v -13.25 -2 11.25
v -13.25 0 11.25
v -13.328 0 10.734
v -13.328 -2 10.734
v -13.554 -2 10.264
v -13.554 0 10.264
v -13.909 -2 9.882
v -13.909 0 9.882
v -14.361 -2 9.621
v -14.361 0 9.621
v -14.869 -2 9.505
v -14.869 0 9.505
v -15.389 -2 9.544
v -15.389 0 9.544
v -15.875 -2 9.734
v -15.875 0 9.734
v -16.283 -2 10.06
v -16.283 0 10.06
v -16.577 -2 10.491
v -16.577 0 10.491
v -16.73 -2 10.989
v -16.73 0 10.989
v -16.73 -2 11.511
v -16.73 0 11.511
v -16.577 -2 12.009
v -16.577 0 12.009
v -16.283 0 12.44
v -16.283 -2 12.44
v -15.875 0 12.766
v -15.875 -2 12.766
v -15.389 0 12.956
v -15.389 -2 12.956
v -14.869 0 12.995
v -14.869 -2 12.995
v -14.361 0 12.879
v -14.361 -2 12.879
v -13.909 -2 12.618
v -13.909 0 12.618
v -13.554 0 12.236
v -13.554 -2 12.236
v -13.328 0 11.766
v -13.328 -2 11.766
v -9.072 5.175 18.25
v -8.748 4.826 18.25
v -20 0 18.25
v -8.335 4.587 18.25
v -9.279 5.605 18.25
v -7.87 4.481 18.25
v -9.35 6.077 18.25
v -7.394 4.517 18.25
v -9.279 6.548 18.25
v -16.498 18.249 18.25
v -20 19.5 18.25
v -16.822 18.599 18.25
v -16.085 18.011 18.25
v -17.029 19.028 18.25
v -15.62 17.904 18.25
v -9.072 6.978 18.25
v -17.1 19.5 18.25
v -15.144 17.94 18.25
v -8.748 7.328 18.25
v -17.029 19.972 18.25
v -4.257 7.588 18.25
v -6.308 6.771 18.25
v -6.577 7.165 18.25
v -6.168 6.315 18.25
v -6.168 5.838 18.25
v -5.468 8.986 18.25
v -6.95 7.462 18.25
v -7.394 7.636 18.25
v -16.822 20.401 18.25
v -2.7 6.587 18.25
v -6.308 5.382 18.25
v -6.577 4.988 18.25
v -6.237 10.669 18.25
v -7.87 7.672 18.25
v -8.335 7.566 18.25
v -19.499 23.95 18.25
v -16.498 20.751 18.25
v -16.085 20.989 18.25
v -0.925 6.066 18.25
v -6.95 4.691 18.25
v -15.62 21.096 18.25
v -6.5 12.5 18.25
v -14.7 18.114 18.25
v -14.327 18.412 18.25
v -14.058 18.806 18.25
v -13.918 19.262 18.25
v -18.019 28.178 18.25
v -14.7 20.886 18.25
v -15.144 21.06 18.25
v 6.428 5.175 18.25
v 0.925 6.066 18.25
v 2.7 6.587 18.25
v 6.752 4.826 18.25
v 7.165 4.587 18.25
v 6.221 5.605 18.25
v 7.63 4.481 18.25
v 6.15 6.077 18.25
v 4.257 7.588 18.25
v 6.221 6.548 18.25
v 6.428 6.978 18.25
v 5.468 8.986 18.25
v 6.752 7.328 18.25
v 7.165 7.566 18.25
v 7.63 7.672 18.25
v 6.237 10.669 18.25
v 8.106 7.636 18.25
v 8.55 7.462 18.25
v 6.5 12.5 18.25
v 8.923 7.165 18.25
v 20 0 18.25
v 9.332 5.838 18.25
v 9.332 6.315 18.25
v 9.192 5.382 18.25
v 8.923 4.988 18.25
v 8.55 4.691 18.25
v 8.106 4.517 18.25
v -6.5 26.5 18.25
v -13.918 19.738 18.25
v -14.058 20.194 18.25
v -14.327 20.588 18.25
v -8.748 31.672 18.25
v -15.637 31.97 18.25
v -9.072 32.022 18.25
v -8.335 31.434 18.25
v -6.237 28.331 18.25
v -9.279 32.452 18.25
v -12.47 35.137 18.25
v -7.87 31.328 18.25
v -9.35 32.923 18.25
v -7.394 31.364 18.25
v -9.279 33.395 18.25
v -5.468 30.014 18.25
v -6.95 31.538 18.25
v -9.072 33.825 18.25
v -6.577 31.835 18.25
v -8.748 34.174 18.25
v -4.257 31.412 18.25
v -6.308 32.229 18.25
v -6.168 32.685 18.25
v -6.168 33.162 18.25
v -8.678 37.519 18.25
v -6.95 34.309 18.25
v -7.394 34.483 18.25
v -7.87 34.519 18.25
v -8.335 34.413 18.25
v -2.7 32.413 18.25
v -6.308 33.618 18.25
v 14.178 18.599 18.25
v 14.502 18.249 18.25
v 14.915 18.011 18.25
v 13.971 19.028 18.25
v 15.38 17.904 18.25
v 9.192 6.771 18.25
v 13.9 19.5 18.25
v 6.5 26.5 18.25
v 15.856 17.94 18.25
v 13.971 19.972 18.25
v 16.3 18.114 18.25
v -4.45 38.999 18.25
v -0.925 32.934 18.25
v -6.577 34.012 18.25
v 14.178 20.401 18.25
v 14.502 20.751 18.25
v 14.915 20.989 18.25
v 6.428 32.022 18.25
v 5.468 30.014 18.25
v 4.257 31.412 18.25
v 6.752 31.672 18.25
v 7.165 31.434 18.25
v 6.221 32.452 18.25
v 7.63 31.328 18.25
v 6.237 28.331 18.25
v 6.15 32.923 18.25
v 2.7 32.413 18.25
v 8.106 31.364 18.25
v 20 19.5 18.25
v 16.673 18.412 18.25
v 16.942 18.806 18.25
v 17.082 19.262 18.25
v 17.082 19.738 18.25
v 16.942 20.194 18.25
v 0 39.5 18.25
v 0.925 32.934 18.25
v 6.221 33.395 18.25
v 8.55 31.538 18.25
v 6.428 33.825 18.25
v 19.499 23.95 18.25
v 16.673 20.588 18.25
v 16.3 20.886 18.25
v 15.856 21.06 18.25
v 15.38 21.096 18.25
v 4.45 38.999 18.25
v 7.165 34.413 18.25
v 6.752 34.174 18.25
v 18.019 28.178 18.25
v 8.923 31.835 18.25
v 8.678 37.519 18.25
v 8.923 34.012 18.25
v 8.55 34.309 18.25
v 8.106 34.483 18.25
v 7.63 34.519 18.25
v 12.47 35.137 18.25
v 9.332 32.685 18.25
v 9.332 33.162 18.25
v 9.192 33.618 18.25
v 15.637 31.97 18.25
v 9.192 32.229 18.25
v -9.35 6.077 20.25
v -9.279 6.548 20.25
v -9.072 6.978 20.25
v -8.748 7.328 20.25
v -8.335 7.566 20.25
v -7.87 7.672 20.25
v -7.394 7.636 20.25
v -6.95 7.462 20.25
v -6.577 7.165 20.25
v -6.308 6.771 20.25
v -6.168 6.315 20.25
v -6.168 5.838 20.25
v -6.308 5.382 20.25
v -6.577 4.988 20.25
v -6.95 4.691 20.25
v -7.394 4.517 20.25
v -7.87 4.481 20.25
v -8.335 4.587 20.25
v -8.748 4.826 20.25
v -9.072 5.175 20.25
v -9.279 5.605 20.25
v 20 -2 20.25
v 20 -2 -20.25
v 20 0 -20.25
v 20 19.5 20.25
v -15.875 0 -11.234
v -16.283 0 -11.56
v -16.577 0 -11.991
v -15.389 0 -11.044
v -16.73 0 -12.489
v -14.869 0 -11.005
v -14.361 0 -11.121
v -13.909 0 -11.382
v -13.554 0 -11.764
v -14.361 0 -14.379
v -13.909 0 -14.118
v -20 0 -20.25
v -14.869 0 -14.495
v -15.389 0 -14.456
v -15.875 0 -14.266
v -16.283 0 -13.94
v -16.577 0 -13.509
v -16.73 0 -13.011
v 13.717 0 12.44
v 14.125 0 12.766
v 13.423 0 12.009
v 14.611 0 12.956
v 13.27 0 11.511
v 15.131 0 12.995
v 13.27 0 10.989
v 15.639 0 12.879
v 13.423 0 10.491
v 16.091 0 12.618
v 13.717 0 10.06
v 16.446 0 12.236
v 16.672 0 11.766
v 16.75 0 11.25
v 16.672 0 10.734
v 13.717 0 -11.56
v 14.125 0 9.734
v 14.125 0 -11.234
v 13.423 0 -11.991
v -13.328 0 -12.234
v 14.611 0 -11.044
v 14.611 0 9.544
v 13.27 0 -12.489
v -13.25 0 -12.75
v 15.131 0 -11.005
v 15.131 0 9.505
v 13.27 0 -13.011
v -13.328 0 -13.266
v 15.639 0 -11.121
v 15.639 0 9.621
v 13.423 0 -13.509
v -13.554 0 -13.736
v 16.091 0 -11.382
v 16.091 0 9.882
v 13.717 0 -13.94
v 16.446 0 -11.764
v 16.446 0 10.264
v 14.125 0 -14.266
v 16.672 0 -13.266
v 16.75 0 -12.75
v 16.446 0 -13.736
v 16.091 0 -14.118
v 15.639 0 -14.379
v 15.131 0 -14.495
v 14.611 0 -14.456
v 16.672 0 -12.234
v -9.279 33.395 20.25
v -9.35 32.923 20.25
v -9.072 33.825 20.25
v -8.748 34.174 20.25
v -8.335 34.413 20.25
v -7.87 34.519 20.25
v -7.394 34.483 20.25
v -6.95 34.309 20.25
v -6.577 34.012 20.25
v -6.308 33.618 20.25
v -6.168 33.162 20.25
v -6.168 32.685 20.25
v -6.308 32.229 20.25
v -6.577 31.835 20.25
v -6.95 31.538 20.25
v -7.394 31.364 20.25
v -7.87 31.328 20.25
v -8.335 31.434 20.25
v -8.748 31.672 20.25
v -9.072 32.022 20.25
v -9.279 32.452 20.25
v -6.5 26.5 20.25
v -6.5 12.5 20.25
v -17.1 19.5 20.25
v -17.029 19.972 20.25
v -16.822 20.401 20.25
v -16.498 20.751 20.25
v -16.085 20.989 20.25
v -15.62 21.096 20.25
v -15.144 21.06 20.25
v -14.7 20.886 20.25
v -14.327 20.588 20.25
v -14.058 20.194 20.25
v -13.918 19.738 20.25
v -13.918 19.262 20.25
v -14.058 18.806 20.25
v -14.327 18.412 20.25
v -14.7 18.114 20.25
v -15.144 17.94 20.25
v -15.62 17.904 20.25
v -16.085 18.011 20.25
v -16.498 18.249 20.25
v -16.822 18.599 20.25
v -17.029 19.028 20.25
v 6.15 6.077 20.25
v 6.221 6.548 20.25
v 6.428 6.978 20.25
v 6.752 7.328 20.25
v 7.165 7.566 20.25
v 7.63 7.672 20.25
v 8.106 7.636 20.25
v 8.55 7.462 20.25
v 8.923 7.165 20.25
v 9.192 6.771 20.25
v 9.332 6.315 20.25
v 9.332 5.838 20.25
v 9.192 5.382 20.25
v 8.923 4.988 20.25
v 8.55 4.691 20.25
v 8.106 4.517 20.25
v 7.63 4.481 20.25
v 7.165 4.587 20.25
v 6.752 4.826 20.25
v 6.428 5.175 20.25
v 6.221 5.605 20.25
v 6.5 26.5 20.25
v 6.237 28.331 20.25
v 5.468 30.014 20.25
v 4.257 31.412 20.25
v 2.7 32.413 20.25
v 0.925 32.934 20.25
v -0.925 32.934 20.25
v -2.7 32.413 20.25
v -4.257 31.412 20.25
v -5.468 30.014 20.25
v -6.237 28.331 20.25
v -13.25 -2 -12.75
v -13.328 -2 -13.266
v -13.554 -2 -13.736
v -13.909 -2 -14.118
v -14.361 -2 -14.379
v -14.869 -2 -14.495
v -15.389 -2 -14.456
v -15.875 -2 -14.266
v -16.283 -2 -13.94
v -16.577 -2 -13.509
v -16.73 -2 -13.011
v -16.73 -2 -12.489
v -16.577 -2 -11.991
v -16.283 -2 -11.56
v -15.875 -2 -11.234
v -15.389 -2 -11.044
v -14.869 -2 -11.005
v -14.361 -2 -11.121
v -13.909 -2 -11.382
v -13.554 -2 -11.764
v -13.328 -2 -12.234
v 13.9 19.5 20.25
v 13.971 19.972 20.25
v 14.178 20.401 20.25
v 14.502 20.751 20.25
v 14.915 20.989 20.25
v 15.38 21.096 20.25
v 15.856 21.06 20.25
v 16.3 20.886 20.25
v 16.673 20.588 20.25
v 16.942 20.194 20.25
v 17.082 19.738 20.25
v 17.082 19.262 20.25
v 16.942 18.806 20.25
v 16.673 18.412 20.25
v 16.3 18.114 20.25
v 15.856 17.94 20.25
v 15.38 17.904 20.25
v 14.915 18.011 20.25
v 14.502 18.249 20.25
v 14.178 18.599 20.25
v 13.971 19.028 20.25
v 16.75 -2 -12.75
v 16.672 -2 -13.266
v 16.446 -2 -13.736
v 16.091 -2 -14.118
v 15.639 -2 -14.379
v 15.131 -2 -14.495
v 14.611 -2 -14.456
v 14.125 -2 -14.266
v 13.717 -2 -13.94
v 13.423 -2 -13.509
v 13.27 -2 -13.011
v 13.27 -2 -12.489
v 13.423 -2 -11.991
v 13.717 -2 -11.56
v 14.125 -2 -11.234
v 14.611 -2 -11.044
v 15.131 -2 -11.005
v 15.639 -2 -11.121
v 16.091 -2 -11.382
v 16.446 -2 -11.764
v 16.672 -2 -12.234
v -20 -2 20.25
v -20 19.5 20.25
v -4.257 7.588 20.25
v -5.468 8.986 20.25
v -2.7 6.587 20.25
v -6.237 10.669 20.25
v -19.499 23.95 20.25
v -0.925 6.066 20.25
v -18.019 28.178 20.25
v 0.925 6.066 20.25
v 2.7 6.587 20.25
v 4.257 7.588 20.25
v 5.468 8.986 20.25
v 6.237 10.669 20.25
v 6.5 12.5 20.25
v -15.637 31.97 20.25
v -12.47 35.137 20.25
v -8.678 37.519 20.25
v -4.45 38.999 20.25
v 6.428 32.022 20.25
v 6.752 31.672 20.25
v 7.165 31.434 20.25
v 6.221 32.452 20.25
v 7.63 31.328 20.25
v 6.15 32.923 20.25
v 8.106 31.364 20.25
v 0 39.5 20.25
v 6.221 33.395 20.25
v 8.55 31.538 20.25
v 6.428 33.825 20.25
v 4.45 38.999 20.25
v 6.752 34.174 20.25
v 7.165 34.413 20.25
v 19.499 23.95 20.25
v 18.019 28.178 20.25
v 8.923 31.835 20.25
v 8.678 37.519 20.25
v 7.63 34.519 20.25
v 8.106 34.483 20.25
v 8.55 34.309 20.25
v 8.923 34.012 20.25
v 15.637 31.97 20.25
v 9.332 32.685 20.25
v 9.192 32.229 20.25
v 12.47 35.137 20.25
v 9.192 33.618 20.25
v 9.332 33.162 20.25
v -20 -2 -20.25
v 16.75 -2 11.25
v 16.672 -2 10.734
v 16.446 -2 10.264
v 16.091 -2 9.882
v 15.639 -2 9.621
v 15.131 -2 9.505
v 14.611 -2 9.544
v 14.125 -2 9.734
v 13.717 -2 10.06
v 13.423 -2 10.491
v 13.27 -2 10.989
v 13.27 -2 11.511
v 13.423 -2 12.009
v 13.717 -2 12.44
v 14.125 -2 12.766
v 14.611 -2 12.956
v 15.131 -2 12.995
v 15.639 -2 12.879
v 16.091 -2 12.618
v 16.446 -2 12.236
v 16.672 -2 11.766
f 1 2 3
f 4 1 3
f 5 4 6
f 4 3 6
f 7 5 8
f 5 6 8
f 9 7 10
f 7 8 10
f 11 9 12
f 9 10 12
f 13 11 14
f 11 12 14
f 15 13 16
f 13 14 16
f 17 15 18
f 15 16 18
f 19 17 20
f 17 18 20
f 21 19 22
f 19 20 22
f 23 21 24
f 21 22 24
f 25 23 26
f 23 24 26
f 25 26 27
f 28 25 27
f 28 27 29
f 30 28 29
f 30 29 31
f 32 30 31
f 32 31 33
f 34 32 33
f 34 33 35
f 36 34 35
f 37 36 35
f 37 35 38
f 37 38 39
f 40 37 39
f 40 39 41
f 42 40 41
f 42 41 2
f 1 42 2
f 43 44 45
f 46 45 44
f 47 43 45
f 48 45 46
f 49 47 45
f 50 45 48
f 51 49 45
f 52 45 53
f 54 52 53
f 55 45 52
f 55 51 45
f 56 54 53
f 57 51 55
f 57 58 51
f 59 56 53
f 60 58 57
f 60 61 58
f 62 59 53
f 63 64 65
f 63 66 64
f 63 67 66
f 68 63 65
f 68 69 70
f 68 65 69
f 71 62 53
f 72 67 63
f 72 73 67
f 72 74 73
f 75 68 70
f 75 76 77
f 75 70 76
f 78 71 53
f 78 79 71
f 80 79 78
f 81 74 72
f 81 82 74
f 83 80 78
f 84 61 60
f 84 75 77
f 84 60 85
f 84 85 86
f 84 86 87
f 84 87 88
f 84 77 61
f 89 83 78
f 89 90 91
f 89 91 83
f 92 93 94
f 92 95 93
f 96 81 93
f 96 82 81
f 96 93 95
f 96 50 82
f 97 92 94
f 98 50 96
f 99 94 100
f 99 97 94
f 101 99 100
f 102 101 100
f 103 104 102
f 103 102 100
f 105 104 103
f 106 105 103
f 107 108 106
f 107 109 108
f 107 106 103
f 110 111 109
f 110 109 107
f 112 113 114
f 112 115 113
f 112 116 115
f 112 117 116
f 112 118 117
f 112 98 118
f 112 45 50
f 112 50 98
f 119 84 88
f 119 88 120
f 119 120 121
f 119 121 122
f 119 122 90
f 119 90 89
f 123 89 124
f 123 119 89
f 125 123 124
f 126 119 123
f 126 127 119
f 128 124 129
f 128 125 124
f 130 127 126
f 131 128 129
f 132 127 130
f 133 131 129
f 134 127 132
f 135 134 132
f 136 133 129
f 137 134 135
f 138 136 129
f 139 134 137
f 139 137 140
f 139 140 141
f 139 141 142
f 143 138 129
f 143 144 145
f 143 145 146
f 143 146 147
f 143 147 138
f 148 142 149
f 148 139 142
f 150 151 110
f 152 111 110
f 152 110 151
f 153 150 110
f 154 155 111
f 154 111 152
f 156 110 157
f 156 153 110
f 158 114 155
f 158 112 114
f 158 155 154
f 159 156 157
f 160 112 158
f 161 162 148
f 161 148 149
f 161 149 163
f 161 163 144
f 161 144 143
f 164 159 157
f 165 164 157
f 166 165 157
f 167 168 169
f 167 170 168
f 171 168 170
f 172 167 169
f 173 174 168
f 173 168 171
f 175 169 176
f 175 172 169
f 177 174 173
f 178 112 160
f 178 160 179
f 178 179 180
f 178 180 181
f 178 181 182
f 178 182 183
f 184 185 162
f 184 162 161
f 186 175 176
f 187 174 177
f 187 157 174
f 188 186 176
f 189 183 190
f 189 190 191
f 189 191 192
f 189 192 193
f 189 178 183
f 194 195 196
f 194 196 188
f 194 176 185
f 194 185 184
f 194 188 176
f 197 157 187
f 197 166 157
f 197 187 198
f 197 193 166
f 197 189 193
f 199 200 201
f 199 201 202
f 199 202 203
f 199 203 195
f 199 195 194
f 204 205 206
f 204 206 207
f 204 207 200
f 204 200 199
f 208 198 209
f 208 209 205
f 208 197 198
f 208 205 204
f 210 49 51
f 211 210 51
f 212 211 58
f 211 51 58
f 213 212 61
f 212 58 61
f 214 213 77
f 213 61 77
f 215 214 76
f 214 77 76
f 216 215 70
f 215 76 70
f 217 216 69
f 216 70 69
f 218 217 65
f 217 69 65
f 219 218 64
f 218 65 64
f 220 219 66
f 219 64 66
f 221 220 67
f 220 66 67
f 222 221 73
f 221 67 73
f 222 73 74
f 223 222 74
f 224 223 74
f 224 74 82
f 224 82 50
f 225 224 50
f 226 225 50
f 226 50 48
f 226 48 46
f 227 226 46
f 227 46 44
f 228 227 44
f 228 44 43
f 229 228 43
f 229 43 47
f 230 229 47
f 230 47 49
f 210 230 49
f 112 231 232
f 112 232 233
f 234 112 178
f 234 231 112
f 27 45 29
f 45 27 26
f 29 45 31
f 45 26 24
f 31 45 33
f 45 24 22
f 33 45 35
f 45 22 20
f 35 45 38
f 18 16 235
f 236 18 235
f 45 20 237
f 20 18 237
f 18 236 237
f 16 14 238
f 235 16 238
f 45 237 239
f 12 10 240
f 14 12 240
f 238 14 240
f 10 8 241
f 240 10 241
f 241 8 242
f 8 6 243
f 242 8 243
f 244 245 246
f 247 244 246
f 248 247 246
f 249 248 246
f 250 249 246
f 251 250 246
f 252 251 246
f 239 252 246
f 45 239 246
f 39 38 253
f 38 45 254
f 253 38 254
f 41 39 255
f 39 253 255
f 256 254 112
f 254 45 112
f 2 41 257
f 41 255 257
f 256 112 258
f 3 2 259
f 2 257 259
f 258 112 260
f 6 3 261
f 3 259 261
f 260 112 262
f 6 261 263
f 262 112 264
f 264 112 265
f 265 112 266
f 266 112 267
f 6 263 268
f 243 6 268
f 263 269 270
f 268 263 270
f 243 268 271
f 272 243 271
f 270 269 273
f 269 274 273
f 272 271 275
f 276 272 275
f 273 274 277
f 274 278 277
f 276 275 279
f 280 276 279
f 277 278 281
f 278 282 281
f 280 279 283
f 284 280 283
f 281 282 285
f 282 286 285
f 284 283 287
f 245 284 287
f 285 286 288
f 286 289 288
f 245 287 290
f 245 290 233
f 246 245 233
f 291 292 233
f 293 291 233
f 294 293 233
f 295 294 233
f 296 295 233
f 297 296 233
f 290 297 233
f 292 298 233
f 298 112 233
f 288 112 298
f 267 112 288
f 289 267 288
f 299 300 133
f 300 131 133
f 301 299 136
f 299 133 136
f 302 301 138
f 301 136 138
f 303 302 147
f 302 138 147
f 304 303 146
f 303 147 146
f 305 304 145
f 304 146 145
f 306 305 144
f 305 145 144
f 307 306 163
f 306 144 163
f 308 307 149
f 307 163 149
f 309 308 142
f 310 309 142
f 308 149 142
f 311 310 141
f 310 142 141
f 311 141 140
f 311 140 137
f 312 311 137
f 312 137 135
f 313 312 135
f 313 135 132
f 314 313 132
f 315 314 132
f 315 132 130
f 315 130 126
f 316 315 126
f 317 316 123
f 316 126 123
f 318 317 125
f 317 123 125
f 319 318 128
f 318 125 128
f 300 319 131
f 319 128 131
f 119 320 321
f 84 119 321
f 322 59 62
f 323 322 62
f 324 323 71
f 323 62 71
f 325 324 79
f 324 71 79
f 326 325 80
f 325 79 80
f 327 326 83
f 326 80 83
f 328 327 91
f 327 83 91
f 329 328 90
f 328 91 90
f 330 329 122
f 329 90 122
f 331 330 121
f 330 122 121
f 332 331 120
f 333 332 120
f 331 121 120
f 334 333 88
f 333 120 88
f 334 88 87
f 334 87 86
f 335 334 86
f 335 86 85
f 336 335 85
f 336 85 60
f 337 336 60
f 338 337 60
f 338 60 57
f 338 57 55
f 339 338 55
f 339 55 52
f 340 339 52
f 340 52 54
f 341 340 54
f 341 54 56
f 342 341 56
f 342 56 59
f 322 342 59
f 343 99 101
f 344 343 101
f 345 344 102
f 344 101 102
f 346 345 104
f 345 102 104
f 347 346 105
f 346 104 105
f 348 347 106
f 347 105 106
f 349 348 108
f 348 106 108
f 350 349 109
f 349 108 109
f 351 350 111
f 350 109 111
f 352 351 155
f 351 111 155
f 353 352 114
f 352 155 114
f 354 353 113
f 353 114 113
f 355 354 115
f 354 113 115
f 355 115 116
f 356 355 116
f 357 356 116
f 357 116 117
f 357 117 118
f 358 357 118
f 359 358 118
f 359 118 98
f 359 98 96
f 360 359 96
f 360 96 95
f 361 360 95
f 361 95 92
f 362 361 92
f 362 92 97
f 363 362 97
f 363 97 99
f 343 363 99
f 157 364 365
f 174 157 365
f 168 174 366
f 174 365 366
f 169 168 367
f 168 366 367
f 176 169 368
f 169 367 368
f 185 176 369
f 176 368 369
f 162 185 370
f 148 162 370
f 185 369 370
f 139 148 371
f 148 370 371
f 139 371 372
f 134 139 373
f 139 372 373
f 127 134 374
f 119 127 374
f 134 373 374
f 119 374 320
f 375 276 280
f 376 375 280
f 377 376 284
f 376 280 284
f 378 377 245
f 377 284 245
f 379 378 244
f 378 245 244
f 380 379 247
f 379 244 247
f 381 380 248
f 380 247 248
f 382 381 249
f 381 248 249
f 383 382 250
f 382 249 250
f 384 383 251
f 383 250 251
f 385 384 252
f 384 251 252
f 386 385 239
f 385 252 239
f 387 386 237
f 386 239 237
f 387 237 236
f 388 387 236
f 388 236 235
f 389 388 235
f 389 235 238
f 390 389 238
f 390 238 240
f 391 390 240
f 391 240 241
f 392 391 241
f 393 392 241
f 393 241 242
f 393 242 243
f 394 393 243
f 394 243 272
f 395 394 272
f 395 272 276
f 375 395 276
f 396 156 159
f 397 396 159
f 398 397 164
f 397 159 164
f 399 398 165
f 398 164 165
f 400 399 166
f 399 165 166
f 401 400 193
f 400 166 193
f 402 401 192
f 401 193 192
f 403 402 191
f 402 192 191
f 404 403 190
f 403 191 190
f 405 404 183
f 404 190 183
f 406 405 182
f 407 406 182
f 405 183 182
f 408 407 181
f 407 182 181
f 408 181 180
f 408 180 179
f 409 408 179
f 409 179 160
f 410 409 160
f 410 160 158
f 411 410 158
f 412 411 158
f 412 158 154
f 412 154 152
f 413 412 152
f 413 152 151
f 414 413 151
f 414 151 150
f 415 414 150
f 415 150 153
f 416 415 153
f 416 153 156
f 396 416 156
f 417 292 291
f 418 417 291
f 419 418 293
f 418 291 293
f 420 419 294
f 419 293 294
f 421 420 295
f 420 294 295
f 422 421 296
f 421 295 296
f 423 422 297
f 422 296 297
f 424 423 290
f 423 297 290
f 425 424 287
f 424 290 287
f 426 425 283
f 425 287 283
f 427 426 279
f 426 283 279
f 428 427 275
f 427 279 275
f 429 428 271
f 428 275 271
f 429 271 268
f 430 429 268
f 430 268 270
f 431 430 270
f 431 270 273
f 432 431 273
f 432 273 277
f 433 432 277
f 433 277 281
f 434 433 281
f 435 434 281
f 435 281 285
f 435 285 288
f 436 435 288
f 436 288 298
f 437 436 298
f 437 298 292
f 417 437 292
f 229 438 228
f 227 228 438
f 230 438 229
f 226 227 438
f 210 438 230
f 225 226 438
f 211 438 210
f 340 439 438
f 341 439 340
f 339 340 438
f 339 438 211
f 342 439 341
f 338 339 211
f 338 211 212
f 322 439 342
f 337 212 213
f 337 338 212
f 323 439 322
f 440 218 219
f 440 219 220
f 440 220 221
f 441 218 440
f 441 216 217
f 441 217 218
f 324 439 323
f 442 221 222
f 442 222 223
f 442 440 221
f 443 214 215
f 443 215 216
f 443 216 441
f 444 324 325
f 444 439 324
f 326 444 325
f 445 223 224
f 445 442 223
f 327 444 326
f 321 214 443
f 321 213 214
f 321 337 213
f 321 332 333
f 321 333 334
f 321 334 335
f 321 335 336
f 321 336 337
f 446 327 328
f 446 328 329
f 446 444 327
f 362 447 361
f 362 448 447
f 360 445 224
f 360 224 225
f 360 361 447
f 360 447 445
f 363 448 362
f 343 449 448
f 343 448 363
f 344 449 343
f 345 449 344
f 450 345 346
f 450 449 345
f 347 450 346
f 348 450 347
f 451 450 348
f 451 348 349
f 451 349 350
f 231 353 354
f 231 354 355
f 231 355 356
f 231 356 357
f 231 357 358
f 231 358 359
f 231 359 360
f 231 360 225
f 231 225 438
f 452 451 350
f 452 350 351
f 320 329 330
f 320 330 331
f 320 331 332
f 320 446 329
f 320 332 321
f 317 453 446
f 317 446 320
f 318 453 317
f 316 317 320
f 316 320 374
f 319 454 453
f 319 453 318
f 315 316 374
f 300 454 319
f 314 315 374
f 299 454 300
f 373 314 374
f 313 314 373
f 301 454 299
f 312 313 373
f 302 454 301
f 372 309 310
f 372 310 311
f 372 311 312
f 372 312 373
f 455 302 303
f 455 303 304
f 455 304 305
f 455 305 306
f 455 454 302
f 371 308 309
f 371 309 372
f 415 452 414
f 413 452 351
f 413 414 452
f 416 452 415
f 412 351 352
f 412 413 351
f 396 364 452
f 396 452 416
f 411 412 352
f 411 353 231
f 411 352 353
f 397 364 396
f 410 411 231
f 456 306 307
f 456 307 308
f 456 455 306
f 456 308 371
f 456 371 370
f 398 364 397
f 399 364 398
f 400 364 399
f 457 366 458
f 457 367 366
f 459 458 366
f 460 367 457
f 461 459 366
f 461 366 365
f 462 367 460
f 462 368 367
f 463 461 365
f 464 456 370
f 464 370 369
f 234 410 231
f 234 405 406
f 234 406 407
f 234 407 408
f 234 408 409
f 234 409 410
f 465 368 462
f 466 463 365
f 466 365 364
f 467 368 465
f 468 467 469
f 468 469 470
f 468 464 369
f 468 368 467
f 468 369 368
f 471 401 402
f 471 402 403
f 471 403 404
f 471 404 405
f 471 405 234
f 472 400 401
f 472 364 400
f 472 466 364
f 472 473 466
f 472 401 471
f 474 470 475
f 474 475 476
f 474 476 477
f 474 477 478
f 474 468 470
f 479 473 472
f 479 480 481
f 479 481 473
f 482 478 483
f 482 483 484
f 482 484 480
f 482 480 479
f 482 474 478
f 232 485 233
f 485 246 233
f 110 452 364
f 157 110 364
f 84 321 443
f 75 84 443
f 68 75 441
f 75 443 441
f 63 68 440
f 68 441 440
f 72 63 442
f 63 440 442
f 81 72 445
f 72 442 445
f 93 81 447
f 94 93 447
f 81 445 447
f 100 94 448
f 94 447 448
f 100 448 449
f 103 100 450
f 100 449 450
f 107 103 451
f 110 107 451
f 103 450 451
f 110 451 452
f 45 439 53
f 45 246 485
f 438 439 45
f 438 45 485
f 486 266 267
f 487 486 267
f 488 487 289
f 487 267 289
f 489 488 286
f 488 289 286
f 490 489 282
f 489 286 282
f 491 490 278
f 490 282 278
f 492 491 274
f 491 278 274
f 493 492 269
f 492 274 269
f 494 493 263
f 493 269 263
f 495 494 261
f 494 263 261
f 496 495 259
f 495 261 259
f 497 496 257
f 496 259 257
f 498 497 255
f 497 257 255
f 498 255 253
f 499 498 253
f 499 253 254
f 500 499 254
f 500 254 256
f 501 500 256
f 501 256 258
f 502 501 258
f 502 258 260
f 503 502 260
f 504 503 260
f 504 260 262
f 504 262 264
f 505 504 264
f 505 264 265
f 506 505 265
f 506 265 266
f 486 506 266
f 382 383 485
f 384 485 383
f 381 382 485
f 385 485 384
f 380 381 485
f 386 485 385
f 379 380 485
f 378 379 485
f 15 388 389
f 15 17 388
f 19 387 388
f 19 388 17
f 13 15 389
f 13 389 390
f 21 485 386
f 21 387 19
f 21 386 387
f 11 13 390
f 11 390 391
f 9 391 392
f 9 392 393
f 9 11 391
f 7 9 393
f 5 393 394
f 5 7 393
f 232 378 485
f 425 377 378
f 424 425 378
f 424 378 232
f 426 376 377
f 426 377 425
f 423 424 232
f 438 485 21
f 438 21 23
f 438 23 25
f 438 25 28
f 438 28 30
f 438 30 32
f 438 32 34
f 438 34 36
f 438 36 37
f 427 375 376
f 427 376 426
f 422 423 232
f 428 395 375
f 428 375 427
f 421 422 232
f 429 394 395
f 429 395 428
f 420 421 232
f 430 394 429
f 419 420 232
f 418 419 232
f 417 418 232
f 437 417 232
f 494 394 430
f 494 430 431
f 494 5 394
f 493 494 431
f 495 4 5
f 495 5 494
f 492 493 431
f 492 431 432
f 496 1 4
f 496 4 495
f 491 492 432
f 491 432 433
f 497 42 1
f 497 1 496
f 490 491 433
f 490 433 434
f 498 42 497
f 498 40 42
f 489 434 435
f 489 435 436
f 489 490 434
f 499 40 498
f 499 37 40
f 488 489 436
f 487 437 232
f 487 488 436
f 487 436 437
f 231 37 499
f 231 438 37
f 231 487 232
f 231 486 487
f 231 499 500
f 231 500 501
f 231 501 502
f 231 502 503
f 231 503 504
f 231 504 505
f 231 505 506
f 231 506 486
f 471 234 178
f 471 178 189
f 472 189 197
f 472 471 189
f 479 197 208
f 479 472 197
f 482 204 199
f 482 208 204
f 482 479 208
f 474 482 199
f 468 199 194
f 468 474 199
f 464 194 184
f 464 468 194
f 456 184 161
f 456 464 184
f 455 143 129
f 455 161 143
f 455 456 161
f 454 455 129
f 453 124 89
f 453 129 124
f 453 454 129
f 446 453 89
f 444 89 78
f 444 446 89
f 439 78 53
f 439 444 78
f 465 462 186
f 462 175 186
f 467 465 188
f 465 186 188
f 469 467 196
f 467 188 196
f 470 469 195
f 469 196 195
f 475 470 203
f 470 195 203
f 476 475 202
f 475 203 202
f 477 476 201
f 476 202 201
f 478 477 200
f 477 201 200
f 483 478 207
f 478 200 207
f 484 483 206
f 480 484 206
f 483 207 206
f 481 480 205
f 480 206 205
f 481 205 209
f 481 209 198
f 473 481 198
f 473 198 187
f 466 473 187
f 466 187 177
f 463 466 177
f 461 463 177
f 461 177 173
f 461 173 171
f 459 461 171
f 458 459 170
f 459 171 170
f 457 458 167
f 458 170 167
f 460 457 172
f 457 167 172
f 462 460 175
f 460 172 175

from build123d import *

# Parameters (mm, degrees)
EXTRUDE_1_DEPTH             = 40.5
SKETCH_2_W                  = 38.5
SKETCH_2_H                  = 19.5
CUT_EXTRUDE_1_DEPTH         = 60.752092014
CUT_EXTRUDE_2_DEPTH         = 2
HOLE_WIZARD_3_5_3_5_1_D     = 3.5
HOLE_WIZARD_3_5_3_5_1_DEPTH = 2
HOLE_WIZARD_3_2_3_2_1_D     = 3.2
HOLE_WIZARD_3_2_3_2_1_DEPTH = 40.5
SKETCH_12_R                 = 1.6
CUT_EXTRUDE_3_DEPTH         = 38.5


with BuildPart() as part:
    # 草图1 → 凸台-拉伸1 (new body)
    with BuildSketch(Plane.XY.offset(20.25)):
        with BuildLine():
            Line((20, -2), (20, 19.5))
            ThreePointArc((20, 19.5), (0, 39.5), (-20, 19.5))
            Line((-20, 19.5), (-20, -2))
            Line((-20, -2), (20, -2))
        make_face()
    extrude(amount=-EXTRUDE_1_DEPTH)

    # 草图2 → 切除-拉伸1 (cut, through all)
    with BuildSketch(Plane(origin=(20, 0, 0), x_dir=(0, 0, -1), z_dir=(1, 0, 0))):
        with Locations((1, 9.75)):
            Rectangle(SKETCH_2_W, SKETCH_2_H)
    extrude(amount=-CUT_EXTRUDE_1_DEPTH, mode=Mode.SUBTRACT)

    # 草图3 → 切除-拉伸2 (cut)
    with BuildSketch(Plane.XY.offset(20.25)):
        with BuildLine():
            Line((-6.5, 26.5), (-6.5, 12.5))
            ThreePointArc((-6.5, 12.5), (0, 6), (6.5, 12.5))
            Line((6.5, 12.5), (6.5, 26.5))
            ThreePointArc((6.5, 26.5), (0, 33), (-6.5, 26.5))
        make_face()
    extrude(amount=-CUT_EXTRUDE_2_DEPTH, mode=Mode.SUBTRACT)

    # Ø3.5 (3.5) 直径孔1
    with Locations(Plane(origin=(0, -2, 0), x_dir=(-1, 0, 0), z_dir=(0, -1, 0))):
        with Locations((15, -11.25), (15, 12.75), (-15, 12.75), (-15, -11.25)):
            Hole(HOLE_WIZARD_3_5_3_5_1_D / 2, depth=HOLE_WIZARD_3_5_3_5_1_DEPTH)

    # Ø3.2 (3.2) 直径孔1
    with Locations(Plane.XY.offset(20.25)):
        with Locations((-7.75, 32.923393759), (-7.75, 6.076606241), (15.5, 19.5), (7.75, 6.076606241), (-15.5, 19.5), (7.75, 32.923393759)):
            Hole(HOLE_WIZARD_3_2_3_2_1_D / 2, depth=HOLE_WIZARD_3_2_3_2_1_DEPTH)

    # 草图12 → 切除-拉伸3 (cut)
    with BuildSketch(Plane(origin=(0, 0, -20.25), x_dir=(-1, 0, 0), z_dir=(0, 0, -1))):
        with BuildLine():
            Line((-20, 19.5), (-17.1, 19.5))
            ThreePointArc((-17.1, 19.5), (-15.5, 21.1), (-13.9, 19.5))
            Line((-13.9, 19.5), (13.9, 19.5))
            ThreePointArc((13.9, 19.5), (15.5, 21.1), (17.1, 19.5))
            Line((17.1, 19.5), (20, 19.5))
            ThreePointArc((20, 19.5), (0, 39.5), (-20, 19.5))
        make_face()
        with Locations(Location((-7.75, 32.923393759, 0), (0, 0, 180))):
            Circle(SKETCH_12_R, mode=Mode.SUBTRACT)
        with Locations(Location((7.75, 32.923393759, 0), (0, 0, 180))):
            Circle(SKETCH_12_R, mode=Mode.SUBTRACT)
    extrude(amount=-CUT_EXTRUDE_3_DEPTH, mode=Mode.SUBTRACT)


solid = part.part
